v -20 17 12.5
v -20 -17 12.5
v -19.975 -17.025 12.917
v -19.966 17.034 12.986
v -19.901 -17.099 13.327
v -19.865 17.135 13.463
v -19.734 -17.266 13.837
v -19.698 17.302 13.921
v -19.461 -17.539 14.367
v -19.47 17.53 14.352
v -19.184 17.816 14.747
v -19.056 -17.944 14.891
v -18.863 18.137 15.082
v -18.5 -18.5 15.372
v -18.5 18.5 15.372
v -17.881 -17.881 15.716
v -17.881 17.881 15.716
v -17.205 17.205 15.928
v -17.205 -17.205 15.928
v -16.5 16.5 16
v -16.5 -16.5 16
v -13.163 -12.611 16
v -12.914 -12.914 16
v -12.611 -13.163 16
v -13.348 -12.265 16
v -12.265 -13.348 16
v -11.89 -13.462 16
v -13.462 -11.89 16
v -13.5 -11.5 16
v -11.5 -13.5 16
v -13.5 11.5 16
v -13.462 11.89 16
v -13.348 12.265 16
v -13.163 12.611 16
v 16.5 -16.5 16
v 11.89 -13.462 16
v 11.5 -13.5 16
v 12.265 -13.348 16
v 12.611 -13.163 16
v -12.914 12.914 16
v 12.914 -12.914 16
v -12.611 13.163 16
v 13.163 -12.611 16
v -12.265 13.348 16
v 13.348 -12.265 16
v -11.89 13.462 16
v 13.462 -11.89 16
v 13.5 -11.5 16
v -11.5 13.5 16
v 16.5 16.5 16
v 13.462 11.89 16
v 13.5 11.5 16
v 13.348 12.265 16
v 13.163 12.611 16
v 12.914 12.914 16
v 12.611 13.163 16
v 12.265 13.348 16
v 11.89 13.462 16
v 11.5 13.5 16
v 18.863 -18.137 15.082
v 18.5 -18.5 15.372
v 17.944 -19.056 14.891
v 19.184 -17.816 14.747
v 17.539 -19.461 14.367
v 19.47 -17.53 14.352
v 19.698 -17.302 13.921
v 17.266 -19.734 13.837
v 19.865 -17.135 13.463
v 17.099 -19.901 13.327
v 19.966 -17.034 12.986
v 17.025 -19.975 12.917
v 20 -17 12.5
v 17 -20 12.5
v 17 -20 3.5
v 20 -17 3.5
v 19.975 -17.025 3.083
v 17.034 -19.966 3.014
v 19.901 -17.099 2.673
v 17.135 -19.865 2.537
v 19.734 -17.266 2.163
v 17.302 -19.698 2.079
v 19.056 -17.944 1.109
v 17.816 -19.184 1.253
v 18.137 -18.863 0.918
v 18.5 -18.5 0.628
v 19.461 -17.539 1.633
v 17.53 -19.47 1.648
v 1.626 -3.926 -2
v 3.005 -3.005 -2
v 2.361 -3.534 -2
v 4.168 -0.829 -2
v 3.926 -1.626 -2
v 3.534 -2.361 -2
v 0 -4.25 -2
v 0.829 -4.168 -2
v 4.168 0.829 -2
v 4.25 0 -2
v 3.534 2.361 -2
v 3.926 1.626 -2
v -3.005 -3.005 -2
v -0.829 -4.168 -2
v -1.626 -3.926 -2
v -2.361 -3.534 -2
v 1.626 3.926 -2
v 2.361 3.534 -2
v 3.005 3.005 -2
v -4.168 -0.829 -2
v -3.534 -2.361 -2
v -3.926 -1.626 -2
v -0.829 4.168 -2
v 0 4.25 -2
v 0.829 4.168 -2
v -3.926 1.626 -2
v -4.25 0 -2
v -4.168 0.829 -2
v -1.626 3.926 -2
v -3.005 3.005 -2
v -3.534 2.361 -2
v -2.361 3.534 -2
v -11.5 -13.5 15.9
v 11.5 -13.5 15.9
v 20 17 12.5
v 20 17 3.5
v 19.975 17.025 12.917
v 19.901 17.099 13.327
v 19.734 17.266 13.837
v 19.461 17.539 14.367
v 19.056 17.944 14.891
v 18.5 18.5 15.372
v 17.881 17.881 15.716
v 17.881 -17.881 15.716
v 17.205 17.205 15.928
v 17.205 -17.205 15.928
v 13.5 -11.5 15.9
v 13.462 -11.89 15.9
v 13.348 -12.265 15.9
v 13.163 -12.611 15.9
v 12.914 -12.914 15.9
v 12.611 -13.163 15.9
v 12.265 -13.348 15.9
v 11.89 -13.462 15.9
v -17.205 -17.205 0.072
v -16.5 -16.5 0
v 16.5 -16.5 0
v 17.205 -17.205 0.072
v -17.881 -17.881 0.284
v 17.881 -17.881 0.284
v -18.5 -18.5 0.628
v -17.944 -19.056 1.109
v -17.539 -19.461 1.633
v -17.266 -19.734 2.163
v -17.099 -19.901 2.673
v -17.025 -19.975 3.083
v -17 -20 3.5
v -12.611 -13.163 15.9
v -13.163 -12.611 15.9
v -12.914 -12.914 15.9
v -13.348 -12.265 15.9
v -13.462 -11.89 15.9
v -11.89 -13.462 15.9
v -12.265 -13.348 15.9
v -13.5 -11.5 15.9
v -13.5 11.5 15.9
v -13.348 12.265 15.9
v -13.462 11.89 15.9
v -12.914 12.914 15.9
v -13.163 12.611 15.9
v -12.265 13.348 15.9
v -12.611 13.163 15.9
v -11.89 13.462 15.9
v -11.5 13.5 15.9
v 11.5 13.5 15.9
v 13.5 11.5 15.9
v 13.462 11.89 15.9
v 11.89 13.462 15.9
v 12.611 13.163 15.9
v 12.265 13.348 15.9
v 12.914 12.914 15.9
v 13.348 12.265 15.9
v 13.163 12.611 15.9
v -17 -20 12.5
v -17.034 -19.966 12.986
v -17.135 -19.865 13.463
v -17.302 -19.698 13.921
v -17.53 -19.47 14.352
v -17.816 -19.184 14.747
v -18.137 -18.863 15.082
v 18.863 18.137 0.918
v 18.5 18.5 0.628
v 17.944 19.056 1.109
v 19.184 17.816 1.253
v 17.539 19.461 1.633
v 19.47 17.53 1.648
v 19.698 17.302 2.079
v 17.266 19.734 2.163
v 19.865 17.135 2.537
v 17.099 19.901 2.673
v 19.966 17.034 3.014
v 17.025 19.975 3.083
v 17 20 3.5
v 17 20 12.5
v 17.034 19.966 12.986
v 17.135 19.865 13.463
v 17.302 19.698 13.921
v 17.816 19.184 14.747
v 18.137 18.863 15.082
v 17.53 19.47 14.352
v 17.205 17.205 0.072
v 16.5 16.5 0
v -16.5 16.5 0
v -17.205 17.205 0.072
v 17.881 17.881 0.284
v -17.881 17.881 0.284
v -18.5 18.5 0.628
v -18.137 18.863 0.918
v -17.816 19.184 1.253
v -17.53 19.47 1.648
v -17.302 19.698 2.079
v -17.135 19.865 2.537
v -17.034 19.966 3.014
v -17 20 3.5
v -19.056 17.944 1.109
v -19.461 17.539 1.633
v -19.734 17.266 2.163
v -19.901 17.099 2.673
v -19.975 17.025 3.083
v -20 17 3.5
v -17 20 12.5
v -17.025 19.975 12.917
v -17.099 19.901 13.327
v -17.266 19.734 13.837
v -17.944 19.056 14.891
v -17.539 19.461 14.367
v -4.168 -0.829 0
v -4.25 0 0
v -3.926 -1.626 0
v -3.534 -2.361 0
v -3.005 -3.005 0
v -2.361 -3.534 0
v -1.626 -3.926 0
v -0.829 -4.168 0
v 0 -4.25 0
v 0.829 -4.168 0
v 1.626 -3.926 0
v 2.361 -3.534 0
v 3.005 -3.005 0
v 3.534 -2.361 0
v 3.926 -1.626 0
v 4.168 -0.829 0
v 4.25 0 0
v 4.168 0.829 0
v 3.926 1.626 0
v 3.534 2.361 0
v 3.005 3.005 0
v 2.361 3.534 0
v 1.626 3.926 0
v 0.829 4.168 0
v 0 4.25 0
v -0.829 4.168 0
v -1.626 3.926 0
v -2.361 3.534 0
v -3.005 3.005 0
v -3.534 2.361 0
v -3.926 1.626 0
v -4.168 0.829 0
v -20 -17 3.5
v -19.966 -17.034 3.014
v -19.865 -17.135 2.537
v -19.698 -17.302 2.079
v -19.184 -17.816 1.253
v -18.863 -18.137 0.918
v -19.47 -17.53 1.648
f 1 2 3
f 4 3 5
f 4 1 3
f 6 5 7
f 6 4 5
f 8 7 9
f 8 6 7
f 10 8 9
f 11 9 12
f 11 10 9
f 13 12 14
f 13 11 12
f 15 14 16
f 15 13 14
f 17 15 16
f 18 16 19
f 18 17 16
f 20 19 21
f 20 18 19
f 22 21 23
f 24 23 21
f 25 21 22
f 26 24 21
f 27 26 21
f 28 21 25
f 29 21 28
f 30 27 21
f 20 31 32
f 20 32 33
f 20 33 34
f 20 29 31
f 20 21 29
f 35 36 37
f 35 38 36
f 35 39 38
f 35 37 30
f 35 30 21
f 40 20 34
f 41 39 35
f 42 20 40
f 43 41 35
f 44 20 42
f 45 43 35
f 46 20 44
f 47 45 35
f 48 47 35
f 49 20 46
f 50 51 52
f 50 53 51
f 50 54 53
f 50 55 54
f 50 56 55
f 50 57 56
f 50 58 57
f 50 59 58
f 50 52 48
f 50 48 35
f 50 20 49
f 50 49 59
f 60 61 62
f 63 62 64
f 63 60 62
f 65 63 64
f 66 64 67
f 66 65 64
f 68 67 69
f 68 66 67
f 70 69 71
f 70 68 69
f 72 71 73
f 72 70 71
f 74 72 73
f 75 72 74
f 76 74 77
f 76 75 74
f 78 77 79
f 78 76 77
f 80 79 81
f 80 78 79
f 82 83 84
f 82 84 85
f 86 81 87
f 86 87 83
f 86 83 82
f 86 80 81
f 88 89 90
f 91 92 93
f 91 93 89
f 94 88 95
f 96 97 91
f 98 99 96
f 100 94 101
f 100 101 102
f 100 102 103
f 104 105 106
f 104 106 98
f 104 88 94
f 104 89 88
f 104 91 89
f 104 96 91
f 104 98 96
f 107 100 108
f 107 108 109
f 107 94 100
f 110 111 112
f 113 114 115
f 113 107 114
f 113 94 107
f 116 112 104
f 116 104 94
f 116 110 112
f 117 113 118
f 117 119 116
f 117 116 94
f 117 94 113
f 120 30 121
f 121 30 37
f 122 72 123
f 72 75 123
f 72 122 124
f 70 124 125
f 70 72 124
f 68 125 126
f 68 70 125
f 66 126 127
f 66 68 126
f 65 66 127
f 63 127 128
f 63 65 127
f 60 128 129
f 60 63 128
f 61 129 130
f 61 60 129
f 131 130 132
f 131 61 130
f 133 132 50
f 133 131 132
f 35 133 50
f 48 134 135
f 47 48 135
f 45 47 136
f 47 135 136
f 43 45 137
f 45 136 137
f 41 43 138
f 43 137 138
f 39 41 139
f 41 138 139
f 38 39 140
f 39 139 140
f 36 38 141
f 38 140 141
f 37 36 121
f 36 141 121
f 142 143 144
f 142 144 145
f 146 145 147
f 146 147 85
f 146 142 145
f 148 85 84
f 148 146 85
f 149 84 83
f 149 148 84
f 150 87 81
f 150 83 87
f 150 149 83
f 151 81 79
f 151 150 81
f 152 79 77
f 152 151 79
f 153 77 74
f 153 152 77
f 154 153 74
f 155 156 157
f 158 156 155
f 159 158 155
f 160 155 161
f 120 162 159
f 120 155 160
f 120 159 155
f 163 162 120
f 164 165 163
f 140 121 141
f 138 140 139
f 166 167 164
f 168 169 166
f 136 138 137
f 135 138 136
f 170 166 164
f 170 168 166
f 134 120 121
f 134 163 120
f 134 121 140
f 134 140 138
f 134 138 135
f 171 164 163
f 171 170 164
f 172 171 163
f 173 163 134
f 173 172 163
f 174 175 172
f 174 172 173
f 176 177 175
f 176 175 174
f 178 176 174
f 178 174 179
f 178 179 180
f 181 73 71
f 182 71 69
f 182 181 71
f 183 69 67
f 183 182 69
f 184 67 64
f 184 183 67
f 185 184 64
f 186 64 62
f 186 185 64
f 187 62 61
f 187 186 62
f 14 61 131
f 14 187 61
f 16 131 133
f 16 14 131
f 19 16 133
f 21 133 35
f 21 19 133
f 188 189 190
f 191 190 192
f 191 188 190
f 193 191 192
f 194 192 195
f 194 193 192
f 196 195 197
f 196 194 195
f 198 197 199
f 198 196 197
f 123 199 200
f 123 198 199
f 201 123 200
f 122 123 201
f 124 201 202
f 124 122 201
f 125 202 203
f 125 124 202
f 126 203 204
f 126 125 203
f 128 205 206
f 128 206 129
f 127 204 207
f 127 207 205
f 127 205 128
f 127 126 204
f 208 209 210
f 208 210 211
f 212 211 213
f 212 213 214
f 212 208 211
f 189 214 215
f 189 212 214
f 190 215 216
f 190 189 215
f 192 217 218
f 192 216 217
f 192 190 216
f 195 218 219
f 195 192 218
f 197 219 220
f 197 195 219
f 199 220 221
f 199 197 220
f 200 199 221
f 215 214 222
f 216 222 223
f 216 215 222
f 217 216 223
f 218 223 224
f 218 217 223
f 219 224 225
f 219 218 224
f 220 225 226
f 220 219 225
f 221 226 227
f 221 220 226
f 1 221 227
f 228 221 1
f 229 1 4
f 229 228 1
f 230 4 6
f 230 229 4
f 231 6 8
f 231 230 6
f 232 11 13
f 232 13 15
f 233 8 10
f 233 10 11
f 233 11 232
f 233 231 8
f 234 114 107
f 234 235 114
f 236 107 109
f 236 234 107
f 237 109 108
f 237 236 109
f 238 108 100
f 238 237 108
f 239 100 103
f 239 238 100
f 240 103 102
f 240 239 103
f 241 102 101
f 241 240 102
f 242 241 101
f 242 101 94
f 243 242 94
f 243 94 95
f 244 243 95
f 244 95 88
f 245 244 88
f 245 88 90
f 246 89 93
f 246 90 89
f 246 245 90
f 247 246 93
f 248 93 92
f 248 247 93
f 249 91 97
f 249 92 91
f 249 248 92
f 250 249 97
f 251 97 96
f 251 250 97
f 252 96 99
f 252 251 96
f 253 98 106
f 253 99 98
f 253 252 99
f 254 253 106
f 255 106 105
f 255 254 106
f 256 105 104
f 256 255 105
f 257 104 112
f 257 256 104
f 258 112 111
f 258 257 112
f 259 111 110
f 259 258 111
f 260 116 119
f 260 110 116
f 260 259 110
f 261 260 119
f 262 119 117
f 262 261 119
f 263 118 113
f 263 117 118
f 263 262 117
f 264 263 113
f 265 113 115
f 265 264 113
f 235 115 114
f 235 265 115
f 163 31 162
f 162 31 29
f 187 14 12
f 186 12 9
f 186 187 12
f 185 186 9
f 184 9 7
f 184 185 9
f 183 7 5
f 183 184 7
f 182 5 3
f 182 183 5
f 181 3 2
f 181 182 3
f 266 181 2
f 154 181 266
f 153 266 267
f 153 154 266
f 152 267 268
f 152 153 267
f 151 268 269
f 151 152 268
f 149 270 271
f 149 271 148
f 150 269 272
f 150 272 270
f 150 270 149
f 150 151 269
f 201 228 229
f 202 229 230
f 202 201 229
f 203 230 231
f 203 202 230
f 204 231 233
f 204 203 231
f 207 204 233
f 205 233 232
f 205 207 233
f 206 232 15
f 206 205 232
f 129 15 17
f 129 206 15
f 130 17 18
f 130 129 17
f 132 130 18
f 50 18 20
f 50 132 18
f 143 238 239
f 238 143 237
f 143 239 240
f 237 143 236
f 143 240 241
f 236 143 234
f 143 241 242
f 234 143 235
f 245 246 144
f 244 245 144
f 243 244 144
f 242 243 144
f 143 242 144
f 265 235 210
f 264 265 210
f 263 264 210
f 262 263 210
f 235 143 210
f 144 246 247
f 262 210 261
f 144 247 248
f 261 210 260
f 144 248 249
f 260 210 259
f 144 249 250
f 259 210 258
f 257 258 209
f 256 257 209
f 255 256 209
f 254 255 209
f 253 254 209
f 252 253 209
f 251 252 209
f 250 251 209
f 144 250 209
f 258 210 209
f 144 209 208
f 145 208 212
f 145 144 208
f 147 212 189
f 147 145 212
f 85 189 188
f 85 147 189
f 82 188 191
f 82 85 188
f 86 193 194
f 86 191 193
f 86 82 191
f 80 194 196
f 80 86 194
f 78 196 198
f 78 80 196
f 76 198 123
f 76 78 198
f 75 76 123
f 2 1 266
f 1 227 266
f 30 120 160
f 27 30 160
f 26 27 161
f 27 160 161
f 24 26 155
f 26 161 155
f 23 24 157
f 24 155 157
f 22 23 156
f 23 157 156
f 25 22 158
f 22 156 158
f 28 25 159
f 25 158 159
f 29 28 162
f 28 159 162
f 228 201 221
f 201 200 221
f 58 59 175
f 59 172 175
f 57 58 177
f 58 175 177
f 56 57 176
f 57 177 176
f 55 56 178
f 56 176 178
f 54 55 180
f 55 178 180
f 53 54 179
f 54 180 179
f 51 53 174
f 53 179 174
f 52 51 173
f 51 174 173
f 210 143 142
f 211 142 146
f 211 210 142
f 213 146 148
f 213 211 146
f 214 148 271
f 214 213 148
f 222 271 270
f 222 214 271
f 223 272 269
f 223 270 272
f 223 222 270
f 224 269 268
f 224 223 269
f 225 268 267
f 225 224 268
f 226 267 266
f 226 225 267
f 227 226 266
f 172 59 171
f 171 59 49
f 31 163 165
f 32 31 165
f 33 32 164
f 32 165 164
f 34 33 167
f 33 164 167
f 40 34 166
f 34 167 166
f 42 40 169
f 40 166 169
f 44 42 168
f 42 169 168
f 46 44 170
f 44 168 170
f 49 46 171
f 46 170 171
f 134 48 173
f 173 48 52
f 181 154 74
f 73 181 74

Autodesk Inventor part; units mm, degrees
ref_plane "YZ Plane" through (0, 0, 0) normal (1, 0, 0) x (0, 1, 0)
ref_plane "XZ Plane" through (0, 0, 0) normal (0, 1, 0) x (-1, 0, 0)
ref_plane "XY Plane" through (0, 0, 0) normal (0, 0, 1) x (1, 0, 0)
sketch "Sketch1" plane through (0, 0, 0) normal (0, 0, 1) x (1, 0, 0)
  line L0 (-20, -20) -> (20, -20)
  line L1 (20, -20) -> (20, 20)
  line L2 (20, 20) -> (-20, 20)
  line L3 (-20, 20) -> (-20, -20)
  line L4 (-20, -20) -> (20, 20) construction
  line L5 (20, -20) -> (-20, 20) construction
  point P0 (0, 0)
  dimension "d0" = 40
  dimension "d1" = 40
extrude "Extrusion1" add sketch "Sketch1" along normal blind 16
sketch "Sketch2" plane through (0, 0, 16) normal (0, 0, 1) x (1, 0, 0)
  line L0 (-13.5, -13.5) -> (13.5, -13.5)
  line L1 (13.5, -13.5) -> (13.5, 13.5)
  line L2 (13.5, 13.5) -> (-13.5, 13.5)
  line L3 (-13.5, 13.5) -> (-13.5, -13.5)
  line L4 (-13.5, -13.5) -> (13.5, 13.5) construction
  line L5 (13.5, -13.5) -> (-13.5, 13.5) construction
  point P0 (0, 0)
  dimension "d7" = 27
  dimension "d8" = 27
extrude "Extrusion2" cut sketch "Sketch2" against normal blind 0.1
fillet "Fillet1" radius 2 4 edges at (-13.5, 13.5, 15.95) (13.5, 13.5, 15.95) (13.5, -13.5, 15.95) (-13.5, -13.5, 15.95)
chamfer "Chamfer1" distance 3 angle 45 4 edges at (20, 20, 8) (20, -20, 8) (-20, -20, 8) (-20, 20, 8)
fillet "Fillet2" radius 3.5 8 edges at (20, 0, 16) (0, 20, 16) (0, -20, 16) (-20, 0, 16) (-20, 0, 0) (20, 0, 0) (0, 20, 0) (0, -20, 0)
sketch "Sketch3" plane through (0, 0, 0) normal (0, 0, -1) x (-1, 0, 0)
  circle A0 centre (0, 0) radius 4.25
  dimension "d13" = 8.5
extrude "Extrusion3" add sketch "Sketch3" along normal blind 2
properties part number "LED Light"
